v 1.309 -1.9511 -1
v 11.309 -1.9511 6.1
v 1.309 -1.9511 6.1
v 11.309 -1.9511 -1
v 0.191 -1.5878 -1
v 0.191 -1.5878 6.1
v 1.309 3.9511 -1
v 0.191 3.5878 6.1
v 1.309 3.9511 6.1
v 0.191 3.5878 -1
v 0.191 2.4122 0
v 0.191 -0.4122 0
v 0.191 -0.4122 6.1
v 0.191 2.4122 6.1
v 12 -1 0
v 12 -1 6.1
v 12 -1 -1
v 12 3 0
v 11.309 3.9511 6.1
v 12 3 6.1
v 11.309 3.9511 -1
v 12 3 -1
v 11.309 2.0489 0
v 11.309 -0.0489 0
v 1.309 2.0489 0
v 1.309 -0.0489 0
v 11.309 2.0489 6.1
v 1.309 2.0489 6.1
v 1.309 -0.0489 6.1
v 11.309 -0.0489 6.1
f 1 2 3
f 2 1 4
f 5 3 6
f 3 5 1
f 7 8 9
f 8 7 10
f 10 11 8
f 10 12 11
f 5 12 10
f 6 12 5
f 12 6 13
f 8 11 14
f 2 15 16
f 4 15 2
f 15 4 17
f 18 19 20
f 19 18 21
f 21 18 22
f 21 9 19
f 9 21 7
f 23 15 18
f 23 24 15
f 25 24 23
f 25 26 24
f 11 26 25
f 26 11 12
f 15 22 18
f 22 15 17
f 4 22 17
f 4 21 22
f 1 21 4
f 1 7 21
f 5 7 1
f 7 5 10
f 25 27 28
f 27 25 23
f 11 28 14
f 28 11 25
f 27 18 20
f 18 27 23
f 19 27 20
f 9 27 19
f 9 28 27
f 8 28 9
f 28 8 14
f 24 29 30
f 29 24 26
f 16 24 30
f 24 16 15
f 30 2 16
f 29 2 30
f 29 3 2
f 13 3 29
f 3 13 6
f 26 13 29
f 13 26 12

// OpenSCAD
module wall(length, height=1, r=1) {
	translate([r, r, 0]) hull() {
		cylinder(r=r, h=height);
		translate([length, 0, 0]) cylinder(r=r, h=height);
	}
}

module clip(depth = 6.1, height = 2) {
	translate([0, 0, -1]) hull() {
		translate([0, height, 0]) wall(10, 1);
		mirror([0, 1, 0]) wall(10, 1);
	}
	
	translate([0, height, 0]) wall(10, depth);
	mirror([0, 1, 0]) wall(10, depth);
}

clip();
